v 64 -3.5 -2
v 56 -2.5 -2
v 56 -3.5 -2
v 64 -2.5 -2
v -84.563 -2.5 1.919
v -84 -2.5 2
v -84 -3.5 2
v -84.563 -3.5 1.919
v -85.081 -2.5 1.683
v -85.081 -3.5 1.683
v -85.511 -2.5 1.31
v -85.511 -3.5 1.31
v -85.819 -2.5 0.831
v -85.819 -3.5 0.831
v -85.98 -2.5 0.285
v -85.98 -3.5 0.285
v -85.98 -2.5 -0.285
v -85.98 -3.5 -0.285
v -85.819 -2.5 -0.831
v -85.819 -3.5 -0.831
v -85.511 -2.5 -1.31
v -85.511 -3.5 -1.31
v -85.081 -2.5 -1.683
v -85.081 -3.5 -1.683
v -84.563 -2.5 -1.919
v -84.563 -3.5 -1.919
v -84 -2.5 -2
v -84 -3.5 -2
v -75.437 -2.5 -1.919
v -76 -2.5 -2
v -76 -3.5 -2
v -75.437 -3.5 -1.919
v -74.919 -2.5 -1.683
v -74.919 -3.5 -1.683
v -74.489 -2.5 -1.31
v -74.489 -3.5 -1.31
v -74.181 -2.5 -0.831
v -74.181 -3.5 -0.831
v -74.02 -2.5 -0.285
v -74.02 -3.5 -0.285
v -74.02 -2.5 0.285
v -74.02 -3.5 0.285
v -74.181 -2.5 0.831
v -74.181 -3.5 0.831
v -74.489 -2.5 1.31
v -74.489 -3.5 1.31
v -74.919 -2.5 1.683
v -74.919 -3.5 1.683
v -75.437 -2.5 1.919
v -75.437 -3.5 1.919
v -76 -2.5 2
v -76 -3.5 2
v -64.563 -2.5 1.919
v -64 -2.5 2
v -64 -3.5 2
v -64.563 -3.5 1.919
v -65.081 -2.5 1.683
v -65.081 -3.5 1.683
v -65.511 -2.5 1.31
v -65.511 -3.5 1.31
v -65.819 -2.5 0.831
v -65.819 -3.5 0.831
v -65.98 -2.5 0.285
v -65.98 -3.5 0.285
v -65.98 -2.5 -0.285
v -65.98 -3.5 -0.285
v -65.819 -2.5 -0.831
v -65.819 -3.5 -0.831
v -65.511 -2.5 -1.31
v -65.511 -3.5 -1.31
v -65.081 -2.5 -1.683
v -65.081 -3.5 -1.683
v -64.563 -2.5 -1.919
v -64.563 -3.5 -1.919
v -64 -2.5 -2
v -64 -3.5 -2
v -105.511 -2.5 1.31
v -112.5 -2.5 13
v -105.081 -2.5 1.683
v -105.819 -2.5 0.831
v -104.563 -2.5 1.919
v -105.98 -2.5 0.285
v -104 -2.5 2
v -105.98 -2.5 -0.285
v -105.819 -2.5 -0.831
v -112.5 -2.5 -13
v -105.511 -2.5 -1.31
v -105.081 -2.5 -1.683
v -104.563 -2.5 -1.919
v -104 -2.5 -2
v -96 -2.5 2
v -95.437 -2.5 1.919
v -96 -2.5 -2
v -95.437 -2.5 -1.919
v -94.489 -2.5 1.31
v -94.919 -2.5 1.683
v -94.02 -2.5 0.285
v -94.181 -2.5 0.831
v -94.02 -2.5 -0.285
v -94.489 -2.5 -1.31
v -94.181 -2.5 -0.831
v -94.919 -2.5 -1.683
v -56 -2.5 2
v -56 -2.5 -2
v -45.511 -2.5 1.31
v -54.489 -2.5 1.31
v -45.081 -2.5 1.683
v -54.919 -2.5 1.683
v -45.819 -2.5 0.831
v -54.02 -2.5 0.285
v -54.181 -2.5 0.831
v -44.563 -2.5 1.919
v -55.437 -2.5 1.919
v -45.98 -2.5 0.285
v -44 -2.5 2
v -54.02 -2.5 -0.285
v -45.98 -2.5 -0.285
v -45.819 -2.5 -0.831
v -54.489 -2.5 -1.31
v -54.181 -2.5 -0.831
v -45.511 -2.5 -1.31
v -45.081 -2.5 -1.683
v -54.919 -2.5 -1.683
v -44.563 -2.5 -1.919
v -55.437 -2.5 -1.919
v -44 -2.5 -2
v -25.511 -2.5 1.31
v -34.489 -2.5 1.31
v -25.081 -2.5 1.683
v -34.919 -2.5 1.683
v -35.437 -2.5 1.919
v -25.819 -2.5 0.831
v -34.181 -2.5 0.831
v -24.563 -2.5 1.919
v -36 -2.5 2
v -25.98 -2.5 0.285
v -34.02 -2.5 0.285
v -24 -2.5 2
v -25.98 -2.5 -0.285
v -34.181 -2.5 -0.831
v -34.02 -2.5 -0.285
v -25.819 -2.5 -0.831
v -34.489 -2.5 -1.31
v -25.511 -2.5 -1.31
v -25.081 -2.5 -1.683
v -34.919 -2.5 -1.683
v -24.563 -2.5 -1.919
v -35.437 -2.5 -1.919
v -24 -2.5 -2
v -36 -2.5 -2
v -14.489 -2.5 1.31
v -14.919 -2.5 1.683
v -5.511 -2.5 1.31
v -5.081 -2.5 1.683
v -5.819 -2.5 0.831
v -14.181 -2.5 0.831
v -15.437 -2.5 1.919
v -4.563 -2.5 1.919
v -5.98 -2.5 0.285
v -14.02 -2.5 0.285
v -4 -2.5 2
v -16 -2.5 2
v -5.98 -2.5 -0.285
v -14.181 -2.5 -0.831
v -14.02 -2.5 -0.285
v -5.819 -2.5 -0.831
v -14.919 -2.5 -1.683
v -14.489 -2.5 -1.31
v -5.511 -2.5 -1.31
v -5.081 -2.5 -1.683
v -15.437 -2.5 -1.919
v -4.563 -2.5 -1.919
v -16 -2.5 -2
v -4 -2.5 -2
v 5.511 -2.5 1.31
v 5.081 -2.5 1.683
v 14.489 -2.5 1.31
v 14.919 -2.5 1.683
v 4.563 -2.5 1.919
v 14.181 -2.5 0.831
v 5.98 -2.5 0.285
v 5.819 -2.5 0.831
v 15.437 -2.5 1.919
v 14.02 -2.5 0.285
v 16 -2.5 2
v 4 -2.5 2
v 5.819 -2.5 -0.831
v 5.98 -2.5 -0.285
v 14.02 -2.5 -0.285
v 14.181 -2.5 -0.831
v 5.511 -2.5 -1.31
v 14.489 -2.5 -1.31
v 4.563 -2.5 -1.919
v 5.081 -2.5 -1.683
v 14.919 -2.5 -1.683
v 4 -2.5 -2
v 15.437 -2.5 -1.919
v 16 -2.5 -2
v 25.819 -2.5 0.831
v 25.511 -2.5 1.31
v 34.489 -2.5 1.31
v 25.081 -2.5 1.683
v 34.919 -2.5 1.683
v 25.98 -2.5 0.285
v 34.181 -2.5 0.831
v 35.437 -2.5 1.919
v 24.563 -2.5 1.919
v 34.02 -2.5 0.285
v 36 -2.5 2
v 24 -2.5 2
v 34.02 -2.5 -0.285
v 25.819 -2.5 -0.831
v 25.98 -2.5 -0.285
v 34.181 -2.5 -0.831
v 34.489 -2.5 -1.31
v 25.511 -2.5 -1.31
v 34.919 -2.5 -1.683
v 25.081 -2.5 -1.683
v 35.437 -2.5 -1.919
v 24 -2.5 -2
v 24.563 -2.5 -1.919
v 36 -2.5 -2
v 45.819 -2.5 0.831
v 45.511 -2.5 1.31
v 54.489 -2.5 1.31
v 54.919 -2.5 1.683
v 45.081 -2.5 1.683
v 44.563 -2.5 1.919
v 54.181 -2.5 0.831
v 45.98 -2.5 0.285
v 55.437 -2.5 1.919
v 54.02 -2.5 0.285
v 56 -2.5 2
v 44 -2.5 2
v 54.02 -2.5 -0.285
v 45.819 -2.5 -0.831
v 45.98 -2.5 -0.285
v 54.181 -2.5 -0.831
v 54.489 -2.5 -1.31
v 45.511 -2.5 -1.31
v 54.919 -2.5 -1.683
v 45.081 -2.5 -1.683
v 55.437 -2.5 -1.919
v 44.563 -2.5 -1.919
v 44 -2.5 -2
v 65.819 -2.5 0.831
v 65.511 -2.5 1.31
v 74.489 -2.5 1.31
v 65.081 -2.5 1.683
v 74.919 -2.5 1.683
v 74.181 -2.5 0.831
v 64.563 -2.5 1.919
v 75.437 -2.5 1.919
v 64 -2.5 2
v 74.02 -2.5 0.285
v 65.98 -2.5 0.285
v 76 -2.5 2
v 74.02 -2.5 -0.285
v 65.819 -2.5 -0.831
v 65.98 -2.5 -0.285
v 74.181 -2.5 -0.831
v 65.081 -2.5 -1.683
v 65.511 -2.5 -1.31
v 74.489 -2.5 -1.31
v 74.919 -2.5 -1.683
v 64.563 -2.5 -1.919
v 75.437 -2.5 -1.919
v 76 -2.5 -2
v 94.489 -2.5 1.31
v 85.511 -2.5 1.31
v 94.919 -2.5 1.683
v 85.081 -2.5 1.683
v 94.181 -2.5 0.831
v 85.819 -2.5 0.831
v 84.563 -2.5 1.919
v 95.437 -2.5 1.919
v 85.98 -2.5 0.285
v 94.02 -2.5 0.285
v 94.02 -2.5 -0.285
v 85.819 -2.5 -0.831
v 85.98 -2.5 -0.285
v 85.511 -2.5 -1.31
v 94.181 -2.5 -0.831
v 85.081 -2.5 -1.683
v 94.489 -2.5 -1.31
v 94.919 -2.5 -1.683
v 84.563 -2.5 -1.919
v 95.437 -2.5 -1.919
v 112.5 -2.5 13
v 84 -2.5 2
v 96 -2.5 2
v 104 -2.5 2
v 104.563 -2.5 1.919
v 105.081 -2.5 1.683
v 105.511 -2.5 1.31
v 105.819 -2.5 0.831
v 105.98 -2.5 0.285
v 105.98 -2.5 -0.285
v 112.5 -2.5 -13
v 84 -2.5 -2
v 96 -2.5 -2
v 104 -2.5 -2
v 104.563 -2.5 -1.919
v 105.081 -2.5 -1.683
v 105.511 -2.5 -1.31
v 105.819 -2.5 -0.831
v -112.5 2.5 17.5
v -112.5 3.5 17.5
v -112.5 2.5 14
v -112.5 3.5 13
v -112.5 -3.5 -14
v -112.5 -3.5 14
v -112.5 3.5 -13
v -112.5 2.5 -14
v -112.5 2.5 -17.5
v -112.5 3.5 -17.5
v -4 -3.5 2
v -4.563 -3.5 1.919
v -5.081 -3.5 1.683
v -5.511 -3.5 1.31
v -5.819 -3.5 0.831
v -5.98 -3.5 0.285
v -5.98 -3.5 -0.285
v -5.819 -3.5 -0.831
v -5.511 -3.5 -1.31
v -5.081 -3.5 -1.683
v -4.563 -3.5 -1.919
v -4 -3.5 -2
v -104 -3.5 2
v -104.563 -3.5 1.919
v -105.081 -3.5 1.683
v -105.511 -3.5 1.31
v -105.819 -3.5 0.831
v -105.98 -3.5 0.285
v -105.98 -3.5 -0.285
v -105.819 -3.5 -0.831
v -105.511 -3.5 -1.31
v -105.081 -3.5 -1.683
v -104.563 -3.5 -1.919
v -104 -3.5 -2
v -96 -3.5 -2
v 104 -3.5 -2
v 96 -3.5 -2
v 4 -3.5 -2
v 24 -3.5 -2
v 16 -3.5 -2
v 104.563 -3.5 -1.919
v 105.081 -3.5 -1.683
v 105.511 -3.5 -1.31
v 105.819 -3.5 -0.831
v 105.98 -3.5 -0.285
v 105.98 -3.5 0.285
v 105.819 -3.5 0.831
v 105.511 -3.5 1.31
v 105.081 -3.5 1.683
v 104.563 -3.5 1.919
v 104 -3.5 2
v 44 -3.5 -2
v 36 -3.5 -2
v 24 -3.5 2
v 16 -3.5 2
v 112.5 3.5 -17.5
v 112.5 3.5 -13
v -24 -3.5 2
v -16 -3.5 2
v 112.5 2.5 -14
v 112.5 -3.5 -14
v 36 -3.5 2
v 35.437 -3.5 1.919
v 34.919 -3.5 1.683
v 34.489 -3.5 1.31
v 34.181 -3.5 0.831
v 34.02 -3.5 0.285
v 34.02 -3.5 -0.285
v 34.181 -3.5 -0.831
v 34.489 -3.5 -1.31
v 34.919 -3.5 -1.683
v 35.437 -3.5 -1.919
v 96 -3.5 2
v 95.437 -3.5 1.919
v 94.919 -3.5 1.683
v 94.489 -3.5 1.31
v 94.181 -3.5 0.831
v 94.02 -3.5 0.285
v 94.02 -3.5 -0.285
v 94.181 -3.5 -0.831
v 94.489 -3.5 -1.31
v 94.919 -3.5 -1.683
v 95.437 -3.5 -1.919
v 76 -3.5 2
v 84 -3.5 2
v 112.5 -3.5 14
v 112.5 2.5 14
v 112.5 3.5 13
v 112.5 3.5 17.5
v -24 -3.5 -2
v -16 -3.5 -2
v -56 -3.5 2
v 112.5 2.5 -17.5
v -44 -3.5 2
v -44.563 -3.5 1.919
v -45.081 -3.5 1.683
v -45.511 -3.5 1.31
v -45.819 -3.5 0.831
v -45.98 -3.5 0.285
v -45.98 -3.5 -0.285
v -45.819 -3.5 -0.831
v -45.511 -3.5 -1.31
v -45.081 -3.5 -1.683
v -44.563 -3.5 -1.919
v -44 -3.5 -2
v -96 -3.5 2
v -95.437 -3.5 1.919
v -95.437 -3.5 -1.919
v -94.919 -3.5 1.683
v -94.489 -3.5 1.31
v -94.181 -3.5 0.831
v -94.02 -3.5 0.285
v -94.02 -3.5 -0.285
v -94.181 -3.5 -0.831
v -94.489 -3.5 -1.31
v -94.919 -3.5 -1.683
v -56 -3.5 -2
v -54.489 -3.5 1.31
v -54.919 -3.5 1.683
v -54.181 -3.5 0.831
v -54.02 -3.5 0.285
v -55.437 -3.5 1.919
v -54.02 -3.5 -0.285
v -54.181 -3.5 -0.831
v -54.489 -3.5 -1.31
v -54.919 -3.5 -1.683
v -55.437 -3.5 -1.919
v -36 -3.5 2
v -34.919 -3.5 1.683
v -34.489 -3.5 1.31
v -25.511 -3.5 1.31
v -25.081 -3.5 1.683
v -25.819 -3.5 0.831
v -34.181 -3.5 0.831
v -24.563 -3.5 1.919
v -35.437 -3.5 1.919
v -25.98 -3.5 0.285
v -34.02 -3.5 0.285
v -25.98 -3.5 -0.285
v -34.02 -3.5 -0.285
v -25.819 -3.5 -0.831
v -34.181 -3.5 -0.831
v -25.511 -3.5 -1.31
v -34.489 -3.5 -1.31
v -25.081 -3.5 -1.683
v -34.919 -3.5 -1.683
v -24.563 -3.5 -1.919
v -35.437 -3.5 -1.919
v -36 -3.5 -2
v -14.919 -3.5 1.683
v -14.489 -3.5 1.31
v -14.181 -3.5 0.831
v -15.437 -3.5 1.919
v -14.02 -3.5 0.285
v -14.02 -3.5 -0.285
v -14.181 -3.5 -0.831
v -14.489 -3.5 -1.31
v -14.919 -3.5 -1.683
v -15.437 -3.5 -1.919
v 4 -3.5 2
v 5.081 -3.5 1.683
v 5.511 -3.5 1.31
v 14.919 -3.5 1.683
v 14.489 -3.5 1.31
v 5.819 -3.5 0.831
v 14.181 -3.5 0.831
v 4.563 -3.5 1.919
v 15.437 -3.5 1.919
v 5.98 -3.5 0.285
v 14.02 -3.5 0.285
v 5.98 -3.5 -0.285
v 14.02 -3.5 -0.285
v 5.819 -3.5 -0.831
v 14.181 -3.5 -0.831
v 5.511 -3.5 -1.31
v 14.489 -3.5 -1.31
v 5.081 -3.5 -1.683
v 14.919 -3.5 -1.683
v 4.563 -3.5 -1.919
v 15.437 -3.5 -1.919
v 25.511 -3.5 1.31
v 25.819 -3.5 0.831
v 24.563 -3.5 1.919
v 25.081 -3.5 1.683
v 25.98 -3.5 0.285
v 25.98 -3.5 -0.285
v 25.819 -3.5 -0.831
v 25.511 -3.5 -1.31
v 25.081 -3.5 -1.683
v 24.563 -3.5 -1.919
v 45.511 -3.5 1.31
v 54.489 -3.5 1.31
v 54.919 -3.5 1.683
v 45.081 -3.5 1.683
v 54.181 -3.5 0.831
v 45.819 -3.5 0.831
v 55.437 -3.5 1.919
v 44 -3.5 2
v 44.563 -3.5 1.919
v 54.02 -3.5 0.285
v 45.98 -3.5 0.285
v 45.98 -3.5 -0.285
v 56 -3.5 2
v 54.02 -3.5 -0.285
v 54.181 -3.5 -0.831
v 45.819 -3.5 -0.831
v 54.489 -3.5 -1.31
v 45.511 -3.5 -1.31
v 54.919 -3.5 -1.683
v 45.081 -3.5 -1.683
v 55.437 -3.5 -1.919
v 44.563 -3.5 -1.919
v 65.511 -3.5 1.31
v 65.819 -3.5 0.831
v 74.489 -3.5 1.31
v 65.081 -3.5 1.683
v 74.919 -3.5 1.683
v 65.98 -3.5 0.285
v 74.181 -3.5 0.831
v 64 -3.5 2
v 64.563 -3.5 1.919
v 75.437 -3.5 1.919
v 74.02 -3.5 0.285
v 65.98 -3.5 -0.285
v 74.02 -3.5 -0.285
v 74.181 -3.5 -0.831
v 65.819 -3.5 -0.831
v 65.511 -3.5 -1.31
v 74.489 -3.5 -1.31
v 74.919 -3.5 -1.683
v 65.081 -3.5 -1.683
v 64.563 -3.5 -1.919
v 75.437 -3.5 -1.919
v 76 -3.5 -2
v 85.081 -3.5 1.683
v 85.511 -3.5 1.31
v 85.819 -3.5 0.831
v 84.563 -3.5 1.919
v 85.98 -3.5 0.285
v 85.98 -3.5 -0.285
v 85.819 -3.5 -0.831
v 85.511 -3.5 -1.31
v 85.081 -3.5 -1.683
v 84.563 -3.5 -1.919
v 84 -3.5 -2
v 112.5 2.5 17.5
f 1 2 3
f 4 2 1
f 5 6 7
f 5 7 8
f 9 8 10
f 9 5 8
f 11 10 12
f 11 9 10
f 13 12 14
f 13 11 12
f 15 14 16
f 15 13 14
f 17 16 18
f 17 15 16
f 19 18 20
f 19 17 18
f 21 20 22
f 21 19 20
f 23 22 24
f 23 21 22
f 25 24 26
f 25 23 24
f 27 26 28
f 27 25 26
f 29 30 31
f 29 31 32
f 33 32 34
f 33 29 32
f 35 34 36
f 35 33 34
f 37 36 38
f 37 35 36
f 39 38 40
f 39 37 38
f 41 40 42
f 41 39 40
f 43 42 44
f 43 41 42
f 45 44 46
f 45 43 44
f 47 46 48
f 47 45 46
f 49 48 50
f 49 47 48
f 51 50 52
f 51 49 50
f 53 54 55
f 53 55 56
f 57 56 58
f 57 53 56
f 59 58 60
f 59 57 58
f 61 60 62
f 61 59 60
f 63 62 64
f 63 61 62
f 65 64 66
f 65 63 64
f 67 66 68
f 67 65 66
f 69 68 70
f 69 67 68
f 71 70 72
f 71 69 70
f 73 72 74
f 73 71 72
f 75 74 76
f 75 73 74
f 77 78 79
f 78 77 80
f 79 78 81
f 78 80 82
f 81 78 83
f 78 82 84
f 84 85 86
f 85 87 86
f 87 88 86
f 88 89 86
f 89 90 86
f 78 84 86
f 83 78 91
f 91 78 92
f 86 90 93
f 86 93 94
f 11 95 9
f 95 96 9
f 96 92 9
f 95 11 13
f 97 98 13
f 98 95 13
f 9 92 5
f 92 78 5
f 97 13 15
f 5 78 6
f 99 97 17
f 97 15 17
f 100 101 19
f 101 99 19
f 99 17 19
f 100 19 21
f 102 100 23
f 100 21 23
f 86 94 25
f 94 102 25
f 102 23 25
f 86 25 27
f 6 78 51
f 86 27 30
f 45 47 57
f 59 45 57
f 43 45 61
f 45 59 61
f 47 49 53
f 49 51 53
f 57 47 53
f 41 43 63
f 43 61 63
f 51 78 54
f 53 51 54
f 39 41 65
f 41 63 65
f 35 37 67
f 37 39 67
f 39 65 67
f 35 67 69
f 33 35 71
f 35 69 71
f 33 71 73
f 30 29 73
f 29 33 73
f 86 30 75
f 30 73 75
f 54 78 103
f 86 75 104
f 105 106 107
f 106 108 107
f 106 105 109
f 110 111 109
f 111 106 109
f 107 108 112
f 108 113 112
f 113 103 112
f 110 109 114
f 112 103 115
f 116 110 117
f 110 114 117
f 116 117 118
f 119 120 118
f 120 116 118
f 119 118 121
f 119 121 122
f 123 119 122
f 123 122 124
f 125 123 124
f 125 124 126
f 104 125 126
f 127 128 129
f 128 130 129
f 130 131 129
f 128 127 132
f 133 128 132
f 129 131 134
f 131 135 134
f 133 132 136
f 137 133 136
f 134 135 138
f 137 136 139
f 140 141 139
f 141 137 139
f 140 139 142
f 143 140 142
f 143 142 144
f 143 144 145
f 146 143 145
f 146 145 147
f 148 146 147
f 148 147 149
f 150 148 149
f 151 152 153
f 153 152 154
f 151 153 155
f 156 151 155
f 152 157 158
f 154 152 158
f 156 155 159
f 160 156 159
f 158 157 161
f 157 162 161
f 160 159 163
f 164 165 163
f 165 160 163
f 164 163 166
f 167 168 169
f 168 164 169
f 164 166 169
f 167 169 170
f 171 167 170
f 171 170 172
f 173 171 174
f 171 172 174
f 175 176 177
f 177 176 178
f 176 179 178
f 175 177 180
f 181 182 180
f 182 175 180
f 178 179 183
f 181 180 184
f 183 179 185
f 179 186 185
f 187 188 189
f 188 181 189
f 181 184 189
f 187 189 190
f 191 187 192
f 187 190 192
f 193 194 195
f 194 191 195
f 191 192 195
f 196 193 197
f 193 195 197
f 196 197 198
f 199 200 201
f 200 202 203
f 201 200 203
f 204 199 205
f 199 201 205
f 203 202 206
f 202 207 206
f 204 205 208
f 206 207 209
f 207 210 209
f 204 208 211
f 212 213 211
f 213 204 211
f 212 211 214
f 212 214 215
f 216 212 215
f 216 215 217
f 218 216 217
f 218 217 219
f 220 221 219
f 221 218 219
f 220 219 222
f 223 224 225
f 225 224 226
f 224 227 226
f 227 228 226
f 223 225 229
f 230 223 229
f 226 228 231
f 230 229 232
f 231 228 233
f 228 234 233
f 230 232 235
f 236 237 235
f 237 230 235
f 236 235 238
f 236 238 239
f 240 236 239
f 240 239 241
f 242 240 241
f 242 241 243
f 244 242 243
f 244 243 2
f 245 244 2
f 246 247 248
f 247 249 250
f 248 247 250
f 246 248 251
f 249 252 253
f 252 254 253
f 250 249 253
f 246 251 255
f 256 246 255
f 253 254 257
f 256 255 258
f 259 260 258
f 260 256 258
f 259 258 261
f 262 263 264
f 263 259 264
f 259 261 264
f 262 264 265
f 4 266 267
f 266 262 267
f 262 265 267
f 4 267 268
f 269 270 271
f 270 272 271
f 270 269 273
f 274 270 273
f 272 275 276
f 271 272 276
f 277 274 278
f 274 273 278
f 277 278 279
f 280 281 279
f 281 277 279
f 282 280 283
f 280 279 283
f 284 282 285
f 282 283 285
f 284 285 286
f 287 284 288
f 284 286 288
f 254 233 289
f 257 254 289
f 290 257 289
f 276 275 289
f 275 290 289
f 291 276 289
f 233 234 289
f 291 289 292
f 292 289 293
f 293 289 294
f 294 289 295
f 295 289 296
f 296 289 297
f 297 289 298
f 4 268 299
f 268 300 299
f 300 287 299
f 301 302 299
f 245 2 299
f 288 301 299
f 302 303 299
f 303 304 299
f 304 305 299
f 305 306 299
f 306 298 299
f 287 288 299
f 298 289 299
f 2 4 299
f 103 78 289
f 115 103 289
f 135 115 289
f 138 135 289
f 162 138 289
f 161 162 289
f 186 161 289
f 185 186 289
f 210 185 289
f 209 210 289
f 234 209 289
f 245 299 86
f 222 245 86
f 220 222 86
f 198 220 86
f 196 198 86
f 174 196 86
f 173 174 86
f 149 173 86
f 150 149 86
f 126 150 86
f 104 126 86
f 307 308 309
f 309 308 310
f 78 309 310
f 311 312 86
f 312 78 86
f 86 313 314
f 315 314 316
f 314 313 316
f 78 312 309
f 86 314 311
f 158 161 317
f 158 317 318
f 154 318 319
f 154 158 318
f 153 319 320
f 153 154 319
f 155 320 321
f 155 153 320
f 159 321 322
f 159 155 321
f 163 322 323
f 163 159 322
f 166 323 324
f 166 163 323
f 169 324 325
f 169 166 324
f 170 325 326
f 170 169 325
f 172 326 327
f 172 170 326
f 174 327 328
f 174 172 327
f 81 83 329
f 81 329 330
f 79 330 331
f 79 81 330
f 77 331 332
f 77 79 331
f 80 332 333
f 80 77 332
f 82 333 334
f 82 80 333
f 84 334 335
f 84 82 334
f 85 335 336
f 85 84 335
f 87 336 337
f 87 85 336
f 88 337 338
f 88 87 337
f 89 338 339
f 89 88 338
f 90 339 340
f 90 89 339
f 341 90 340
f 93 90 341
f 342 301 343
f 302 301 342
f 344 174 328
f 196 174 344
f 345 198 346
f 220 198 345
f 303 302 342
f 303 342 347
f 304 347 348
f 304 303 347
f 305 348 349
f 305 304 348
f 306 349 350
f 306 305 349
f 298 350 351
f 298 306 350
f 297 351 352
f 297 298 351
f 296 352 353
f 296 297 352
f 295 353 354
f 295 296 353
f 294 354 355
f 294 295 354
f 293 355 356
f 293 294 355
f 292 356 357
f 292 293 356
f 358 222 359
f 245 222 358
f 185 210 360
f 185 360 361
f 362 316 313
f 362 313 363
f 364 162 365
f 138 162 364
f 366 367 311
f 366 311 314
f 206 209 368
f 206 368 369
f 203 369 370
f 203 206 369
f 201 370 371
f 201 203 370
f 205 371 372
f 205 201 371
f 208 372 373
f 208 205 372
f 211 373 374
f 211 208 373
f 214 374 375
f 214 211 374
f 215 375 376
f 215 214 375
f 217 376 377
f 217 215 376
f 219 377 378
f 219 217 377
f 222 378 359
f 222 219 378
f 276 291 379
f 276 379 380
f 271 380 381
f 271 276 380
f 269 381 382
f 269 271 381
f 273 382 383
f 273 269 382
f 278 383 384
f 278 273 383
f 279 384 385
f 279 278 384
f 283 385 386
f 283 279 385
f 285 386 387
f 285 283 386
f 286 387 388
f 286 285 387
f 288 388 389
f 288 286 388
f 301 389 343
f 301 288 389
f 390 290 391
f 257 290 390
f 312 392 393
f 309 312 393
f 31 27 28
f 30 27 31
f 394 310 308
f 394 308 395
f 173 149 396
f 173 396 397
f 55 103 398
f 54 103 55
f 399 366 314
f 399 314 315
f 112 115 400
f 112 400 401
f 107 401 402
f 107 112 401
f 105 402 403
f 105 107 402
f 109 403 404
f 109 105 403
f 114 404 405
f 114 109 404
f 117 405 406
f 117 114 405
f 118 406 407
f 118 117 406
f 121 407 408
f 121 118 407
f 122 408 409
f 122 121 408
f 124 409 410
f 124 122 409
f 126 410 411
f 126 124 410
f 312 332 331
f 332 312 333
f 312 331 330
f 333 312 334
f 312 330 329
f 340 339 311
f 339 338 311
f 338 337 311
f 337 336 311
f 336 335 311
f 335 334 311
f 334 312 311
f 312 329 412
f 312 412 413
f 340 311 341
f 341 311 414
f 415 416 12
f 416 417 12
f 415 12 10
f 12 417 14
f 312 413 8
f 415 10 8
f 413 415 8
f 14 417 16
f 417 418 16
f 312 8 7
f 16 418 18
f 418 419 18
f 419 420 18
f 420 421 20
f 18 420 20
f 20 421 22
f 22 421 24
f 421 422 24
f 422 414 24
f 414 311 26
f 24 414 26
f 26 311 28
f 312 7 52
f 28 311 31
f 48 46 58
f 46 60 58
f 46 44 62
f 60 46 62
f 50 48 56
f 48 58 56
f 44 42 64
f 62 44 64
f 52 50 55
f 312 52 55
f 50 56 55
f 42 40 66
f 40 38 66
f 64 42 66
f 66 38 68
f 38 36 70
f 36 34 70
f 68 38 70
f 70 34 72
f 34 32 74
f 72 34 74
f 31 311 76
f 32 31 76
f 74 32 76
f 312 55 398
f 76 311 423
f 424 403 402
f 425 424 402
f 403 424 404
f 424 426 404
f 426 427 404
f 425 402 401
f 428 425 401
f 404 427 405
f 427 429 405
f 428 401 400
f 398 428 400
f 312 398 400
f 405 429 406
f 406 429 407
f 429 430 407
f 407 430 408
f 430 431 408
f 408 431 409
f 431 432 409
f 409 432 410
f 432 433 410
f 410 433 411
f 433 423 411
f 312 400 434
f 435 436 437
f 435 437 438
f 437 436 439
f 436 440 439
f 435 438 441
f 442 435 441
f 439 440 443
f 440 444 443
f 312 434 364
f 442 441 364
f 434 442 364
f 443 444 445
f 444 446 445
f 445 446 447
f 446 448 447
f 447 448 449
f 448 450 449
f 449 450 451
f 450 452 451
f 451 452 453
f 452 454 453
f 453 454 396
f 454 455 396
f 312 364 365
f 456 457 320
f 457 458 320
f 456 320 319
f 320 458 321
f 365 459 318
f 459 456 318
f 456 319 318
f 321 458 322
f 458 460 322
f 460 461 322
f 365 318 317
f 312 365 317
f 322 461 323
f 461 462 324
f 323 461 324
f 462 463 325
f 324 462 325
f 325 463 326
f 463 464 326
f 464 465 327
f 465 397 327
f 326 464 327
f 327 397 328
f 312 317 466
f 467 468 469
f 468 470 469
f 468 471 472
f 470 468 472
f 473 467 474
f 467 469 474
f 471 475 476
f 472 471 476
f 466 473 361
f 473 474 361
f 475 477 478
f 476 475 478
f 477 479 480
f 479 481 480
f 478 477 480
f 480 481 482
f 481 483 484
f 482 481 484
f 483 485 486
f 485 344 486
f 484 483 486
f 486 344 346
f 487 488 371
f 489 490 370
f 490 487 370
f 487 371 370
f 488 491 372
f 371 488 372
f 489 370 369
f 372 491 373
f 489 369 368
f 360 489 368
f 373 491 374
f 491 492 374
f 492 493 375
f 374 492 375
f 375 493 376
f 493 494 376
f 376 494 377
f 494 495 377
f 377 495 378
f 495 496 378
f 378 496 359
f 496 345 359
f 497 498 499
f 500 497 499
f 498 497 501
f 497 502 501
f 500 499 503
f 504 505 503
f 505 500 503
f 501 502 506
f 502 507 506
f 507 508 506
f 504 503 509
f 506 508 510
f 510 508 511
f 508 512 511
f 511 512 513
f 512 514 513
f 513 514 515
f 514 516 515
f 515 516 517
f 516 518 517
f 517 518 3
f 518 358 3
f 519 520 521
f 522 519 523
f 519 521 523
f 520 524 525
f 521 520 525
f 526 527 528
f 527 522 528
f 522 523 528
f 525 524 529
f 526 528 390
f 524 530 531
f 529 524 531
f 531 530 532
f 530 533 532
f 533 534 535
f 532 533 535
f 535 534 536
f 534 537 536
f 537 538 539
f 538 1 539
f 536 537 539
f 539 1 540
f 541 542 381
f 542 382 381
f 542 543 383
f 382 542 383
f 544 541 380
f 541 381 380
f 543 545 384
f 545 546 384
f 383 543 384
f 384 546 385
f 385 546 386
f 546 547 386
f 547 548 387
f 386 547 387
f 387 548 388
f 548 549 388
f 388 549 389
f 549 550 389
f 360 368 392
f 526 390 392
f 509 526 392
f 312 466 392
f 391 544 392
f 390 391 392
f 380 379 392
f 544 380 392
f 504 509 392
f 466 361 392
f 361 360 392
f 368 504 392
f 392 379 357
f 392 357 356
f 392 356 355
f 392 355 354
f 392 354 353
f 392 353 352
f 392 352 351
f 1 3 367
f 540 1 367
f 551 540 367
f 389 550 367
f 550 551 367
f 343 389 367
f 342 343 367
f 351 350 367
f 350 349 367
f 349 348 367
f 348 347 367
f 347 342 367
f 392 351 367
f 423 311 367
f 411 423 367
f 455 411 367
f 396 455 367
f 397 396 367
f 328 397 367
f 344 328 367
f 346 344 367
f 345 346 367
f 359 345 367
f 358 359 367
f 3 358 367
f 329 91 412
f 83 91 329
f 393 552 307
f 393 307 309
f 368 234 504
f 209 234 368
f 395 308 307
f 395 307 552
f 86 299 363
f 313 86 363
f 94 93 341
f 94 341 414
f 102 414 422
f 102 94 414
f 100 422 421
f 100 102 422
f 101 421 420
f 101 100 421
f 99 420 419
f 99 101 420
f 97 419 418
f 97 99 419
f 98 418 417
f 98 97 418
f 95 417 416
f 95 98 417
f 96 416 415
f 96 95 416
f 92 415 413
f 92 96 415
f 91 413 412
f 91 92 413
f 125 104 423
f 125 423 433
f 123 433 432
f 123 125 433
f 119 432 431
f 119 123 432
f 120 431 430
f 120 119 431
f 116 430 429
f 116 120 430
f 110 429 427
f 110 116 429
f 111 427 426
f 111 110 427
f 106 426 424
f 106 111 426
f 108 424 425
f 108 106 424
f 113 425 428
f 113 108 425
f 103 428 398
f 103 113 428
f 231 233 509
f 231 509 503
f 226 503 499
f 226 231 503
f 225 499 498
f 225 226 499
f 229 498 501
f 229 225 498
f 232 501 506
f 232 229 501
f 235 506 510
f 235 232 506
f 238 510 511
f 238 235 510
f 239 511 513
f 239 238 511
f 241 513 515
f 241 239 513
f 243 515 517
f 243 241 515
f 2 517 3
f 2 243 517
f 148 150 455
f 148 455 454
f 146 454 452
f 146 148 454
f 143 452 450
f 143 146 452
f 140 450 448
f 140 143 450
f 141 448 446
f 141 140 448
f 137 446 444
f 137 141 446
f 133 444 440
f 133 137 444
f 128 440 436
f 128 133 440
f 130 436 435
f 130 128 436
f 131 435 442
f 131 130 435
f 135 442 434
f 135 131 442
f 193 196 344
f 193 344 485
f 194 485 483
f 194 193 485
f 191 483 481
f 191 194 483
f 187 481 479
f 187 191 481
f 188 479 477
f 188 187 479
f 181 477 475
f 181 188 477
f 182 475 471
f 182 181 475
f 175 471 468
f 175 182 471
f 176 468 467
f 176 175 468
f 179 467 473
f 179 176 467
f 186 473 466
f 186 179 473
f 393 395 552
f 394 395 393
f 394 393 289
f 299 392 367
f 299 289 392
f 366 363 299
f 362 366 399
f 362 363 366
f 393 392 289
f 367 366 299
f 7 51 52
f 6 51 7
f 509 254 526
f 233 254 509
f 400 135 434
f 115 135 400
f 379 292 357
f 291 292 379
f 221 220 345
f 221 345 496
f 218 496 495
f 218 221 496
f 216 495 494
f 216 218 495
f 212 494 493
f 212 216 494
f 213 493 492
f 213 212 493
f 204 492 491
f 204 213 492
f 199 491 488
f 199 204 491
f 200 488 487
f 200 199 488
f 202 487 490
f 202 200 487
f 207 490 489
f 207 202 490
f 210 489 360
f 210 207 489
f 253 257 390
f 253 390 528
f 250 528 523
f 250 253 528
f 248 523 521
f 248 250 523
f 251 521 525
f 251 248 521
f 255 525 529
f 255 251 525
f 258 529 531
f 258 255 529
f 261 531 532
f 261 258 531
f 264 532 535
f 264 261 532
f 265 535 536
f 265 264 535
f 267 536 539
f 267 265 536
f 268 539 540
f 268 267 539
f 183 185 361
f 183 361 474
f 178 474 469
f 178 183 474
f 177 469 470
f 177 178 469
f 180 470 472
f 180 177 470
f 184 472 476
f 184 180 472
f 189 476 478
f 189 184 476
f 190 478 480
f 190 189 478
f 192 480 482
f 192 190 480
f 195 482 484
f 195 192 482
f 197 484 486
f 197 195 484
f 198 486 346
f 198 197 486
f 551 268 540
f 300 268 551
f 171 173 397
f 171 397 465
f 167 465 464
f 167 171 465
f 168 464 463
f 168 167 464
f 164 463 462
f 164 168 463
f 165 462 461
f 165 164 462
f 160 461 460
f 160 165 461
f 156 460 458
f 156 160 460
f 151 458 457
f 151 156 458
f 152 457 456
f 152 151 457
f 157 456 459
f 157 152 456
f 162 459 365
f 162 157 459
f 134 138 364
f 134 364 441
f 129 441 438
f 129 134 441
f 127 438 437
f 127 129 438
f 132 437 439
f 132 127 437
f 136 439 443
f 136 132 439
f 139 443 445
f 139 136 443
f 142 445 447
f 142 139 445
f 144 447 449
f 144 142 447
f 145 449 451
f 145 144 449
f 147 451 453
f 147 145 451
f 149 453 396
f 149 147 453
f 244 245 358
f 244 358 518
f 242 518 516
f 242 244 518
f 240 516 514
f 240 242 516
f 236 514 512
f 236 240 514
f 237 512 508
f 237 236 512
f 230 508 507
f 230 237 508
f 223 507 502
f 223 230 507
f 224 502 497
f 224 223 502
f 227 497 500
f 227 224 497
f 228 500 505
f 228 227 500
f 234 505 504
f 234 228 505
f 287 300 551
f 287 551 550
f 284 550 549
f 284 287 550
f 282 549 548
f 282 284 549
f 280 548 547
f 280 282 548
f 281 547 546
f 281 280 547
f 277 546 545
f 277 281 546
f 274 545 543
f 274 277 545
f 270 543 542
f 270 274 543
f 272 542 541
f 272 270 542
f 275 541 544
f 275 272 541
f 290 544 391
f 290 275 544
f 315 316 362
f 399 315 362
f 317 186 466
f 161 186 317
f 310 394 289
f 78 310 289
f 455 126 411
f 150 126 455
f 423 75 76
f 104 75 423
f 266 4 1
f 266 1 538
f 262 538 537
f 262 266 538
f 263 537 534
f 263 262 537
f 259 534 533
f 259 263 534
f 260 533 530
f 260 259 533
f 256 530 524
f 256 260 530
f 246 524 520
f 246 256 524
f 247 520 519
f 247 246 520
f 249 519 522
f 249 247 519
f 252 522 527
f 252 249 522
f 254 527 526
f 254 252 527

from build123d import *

# Parameters (mm, degrees)
SKETCH1_W           = 225
SKETCH1_H           = 35
BOSS_EXTRUDE1_DEPTH = 3.5
SKETCH2_W           = 3.5
SKETCH2_H           = 6
CUT_EXTRUDE1_DEPTH  = 226
CUT_EXTRUDE2_DEPTH  = 2


with BuildPart() as part:
    # Sketch1 → Boss-Extrude1 (new body, symmetric)
    with BuildSketch(Plane(origin=(0, 0, 0), x_dir=(1, 0, 0), z_dir=(0, 1, 0))):
        Rectangle(SKETCH1_W, SKETCH1_H)
    extrude(amount=BOSS_EXTRUDE1_DEPTH, both=True)

    # Sketch2 → Cut-Extrude1 (cut, through all)
    with BuildSketch(Plane(origin=(112.5, 0, 0), x_dir=(0, 0, -1), z_dir=(1, 0, 0))):
        Polygon((-13, -2.5), (0, -2.5), (13, -2.5), (13, 3.5), (-13, 3.5), align=None)
        with Locations((15.75, -0.5)):
            Rectangle(SKETCH2_W, SKETCH2_H)
        with Locations((-15.75, -0.5)):
            Rectangle(SKETCH2_W, SKETCH2_H)
    extrude(amount=-CUT_EXTRUDE1_DEPTH, mode=Mode.SUBTRACT)

    # Sketch3 → Cut-Extrude2 (cut, through all)
    with BuildSketch(Plane(origin=(0, -2.5, 0), x_dir=(1, 0, 0), z_dir=(0, 1, 0))):
        with BuildLine():
            Line((-4, 2), (4, 2))
            ThreePointArc((4, 2), (6, 0), (4, -2))
            Line((4, -2), (-4, -2))
            ThreePointArc((-4, -2), (-6, 0), (-4, 2))
        make_face()
        with BuildLine():
            Line((16, 2), (24, 2))
            ThreePointArc((24, 2), (26, 0), (24, -2))
            Line((24, -2), (16, -2))
            ThreePointArc((16, -2), (14, 0), (16, 2))
        make_face()
        with BuildLine():
            Line((36, 2), (44, 2))
            ThreePointArc((44, 2), (46, 0), (44, -2))
            Line((44, -2), (36, -2))
            ThreePointArc((36, -2), (34, 0), (36, 2))
        make_face()
        with BuildLine():
            Line((56, 2), (64, 2))
            ThreePointArc((64, 2), (66, 0), (64, -2))
            Line((64, -2), (56, -2))
            ThreePointArc((56, -2), (54, 0), (56, 2))
        make_face()
        with BuildLine():
            Line((76, 2), (84, 2))
            ThreePointArc((84, 2), (86, 0), (84, -2))
            Line((84, -2), (76, -2))
            ThreePointArc((76, -2), (74, 0), (76, 2))
        make_face()
        with BuildLine():
            Line((-24, 2), (-16, 2))
            ThreePointArc((-16, 2), (-14, 0), (-16, -2))
            Line((-16, -2), (-24, -2))
            ThreePointArc((-24, -2), (-26, 0), (-24, 2))
        make_face()
        with BuildLine():
            Line((-44, 2), (-36, 2))
            ThreePointArc((-36, 2), (-34, 0), (-36, -2))
            Line((-36, -2), (-44, -2))
            ThreePointArc((-44, -2), (-46, 0), (-44, 2))
        make_face()
        with BuildLine():
            Line((-64, 2), (-56, 2))
            ThreePointArc((-56, 2), (-54, 0), (-56, -2))
            Line((-56, -2), (-64, -2))
            ThreePointArc((-64, -2), (-66, 0), (-64, 2))
        make_face()
        with BuildLine():
            Line((-84, 2), (-76, 2))
            ThreePointArc((-76, 2), (-74, 0), (-76, -2))
            Line((-76, -2), (-84, -2))
            ThreePointArc((-84, -2), (-86, 0), (-84, 2))
        make_face()
        with BuildLine():
            Line((-104, 2), (-96, 2))
            ThreePointArc((-96, 2), (-94, 0), (-96, -2))
            Line((-96, -2), (-104, -2))
            ThreePointArc((-104, -2), (-106, 0), (-104, 2))
        make_face()
        with BuildLine():
            Line((-124, 2), (-116, 2))
            ThreePointArc((-116, 2), (-114, 0), (-116, -2))
            Line((-116, -2), (-124, -2))
            ThreePointArc((-124, -2), (-126, 0), (-124, 2))
        make_face()
        with BuildLine():
            Line((-144, 2), (-136, 2))
            ThreePointArc((-136, 2), (-134, 0), (-136, -2))
            Line((-136, -2), (-144, -2))
            ThreePointArc((-144, -2), (-146, 0), (-144, 2))
        make_face()
        with BuildLine():
            Line((96, 2), (104, 2))
            ThreePointArc((104, 2), (106, 0), (104, -2))
            Line((104, -2), (96, -2))
            ThreePointArc((96, -2), (94, 0), (96, 2))
        make_face()
        with BuildLine():
            Line((116, 2), (124, 2))
            ThreePointArc((124, 2), (126, 0), (124, -2))
            Line((124, -2), (116, -2))
            ThreePointArc((116, -2), (114, 0), (116, 2))
        make_face()
        with BuildLine():
            Line((136, 2), (144, 2))
            ThreePointArc((144, 2), (146, 0), (144, -2))
            Line((144, -2), (136, -2))
            ThreePointArc((136, -2), (134, 0), (136, 2))
        make_face()
    extrude(amount=-CUT_EXTRUDE2_DEPTH, mode=Mode.SUBTRACT)


solid = part.part
